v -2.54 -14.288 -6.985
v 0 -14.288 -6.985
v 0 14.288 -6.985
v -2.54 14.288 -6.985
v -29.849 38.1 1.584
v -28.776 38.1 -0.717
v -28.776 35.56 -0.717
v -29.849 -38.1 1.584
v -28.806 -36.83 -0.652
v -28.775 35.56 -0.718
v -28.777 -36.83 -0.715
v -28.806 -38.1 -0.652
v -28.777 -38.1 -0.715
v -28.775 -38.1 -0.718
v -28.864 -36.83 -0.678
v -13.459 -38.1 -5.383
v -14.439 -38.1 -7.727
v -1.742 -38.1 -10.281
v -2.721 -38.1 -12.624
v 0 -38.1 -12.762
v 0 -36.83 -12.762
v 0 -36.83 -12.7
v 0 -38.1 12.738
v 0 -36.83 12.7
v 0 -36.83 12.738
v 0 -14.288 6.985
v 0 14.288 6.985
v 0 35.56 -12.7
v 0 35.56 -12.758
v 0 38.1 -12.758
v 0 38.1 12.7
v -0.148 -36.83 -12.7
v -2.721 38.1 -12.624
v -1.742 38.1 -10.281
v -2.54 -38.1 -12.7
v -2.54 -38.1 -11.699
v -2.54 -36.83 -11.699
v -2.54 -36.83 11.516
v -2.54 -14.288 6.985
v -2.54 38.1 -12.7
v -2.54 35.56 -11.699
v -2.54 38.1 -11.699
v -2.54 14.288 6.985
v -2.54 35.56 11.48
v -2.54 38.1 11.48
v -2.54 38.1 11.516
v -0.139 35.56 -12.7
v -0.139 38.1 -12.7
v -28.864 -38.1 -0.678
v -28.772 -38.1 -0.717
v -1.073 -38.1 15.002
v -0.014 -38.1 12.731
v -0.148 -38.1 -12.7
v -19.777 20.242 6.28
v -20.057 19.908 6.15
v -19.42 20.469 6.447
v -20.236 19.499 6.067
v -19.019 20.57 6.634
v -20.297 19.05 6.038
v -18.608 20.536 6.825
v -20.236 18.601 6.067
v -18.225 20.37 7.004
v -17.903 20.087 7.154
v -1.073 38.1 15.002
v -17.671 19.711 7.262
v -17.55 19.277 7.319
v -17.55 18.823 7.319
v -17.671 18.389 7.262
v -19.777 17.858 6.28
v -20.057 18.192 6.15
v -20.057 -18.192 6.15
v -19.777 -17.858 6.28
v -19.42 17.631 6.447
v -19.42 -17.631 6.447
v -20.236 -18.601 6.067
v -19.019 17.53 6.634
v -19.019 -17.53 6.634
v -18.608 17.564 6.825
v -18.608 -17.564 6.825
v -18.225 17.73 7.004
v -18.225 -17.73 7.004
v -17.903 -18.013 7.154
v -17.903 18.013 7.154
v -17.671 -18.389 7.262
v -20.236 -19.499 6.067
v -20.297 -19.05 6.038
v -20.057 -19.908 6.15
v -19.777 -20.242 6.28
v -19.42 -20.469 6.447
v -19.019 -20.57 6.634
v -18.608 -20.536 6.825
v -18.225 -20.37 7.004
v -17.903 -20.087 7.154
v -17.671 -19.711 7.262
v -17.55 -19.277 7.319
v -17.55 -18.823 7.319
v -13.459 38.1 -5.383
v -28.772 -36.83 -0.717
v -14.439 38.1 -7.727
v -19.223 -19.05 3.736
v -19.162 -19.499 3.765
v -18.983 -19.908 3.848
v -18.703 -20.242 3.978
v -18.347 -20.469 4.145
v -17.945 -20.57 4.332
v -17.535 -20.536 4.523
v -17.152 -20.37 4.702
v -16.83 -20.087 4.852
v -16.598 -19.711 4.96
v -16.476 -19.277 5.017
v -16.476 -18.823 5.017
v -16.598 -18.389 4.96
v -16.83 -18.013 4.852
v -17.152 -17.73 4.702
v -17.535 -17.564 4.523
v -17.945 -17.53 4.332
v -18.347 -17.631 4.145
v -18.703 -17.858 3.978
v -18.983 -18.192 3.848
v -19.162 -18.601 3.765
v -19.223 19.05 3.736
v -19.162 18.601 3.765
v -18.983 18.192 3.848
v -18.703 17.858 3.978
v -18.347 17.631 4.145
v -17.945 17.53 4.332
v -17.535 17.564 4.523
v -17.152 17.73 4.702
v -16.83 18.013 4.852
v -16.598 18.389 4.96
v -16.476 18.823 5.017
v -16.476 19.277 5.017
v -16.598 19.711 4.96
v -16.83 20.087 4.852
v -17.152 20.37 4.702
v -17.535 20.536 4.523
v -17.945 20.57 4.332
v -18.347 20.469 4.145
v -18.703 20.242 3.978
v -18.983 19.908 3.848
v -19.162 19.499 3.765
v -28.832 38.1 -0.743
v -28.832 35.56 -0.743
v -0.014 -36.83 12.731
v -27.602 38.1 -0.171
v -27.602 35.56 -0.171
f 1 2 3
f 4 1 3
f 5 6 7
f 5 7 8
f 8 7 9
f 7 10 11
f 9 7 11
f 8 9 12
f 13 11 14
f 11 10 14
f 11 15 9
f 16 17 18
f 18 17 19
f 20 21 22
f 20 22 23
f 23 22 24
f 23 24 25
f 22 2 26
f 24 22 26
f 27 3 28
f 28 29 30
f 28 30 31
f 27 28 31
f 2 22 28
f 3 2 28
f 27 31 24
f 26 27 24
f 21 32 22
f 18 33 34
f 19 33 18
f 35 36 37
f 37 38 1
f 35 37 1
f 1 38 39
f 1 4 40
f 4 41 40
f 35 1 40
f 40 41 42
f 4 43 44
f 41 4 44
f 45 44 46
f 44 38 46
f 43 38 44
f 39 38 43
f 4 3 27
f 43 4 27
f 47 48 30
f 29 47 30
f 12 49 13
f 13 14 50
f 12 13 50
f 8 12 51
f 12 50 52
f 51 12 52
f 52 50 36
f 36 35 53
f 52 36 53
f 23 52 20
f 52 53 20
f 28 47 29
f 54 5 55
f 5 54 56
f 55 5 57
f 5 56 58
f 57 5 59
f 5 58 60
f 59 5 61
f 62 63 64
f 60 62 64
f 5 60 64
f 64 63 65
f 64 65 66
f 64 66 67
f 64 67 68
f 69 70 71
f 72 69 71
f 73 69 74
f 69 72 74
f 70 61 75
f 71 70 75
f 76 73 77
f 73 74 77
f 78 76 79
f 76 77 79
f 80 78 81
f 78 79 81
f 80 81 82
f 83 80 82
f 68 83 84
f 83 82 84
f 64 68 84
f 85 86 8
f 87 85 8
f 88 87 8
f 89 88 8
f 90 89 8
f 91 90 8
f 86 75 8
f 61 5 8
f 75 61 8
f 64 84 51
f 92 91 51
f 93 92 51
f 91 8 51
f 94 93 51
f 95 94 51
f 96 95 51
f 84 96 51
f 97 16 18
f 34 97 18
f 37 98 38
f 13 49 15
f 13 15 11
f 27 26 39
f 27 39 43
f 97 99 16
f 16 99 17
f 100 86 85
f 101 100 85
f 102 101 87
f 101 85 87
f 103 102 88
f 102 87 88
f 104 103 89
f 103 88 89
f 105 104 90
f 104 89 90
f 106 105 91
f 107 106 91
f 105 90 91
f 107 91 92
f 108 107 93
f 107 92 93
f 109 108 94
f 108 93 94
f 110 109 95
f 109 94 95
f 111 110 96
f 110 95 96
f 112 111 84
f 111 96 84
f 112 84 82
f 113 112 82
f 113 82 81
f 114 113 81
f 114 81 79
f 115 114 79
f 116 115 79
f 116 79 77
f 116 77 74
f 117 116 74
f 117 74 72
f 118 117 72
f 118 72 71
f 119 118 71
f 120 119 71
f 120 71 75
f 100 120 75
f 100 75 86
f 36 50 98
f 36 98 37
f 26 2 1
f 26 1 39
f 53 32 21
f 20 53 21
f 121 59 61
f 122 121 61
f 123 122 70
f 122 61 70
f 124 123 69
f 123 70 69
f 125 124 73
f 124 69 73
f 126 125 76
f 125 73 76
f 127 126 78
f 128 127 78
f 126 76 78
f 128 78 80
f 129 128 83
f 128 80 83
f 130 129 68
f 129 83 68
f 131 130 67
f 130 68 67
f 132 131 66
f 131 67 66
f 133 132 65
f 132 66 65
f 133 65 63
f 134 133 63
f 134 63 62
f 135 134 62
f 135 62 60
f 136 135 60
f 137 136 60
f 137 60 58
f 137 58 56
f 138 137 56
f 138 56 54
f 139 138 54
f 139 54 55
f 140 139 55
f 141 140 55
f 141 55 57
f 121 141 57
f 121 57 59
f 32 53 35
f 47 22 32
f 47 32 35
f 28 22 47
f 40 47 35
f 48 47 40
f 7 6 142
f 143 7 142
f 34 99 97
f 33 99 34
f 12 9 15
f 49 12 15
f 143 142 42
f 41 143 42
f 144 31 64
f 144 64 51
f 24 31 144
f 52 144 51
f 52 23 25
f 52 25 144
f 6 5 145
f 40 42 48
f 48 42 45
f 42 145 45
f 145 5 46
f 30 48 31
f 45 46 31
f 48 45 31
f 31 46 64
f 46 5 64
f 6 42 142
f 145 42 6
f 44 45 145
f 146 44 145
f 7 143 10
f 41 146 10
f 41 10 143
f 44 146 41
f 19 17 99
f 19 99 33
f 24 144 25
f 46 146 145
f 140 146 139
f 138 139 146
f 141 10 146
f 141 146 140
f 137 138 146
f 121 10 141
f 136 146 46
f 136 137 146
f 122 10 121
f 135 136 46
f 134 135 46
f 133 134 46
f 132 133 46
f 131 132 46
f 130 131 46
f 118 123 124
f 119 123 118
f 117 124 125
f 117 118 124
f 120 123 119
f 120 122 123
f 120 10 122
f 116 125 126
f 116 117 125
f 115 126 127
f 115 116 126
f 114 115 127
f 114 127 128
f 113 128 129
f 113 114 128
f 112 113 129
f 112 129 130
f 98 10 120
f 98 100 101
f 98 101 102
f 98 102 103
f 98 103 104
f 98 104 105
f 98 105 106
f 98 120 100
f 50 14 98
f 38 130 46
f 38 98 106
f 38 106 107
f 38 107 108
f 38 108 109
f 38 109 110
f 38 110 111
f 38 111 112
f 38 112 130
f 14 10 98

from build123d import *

# Parameters (mm, degrees)
F7_DEPTH  = 1.27
F8_DEPTH  = 1.27
F0_W      = 76.2
F0_H      = 25.4
F0_W_2    = 28.575
F0_H_2    = 13.97
F9_DEPTH  = 2.54
F2_W      = 31.75
F2_H      = 76.2
F10_DEPTH = 2.54
F11_DEPTH = 2.54
F12_D     = 3.048
F14_W     = 12.7
F14_H     = 76.2
F15_DEPTH = 2.54


with BuildPart() as f7:
    # F6 (on offset) → F7 (new body)
    with BuildSketch(Plane.XZ.offset(38.1)):
        Polygon((0, -12.7621218562), (0, 12.7376662567), (-28.863908723, -0.6782670389), align=None)
    extrude(amount=-F7_DEPTH)

    # F6 (on offset) → F8 (join)
    with BuildSketch(Plane.XZ.offset(38.1)):
        Polygon((0, -12.7621218562), (0, 12.7376662567), (-28.863908723, -0.6782670389), align=None)
    extrude(amount=-F8_DEPTH)

    # F0 (on Right) → F9 (join)
    with BuildSketch(Plane.YZ):
        Rectangle(F0_W, F0_H)
        Rectangle(F0_W_2, F0_H_2, mode=Mode.SUBTRACT)
    extrude(amount=-F9_DEPTH)

    # F2 (on line) → F10 (join)
    with BuildSketch(Plane(origin=(-4.8643822138, 0, 10.4317013215), x_dir=(0.906307787, 0, 0.4226182617), z_dir=(0.4226182617, 0, -0.906307787))):
        with Locations((-10.5077480759, 0)):
            Rectangle(F2_W, F2_H)
    extrude(amount=-F10_DEPTH)

    # F5 (on offset) → F11 (join)
    with BuildSketch(Plane.XZ.offset(-38.1)):
        Polygon((0, -12.7577763051), (0, 12.6607520506), (-28.8317464292, -0.7427155506), align=None)
    extrude(amount=F11_DEPTH)

    # F12 (through all)
    with Locations(Plane(origin=(-4.8643822138, 0, 10.4317013215), x_dir=(0.906307787, 0, 0.4226182617), z_dir=(0.4226182617, 0, -0.906307787))):
        with Locations((-14.3194701523, 19.05), (-14.3194701523, -19.05)):
            Hole(F12_D / 2)


with BuildPart() as f15:
    # F14 (on face) → F15 (new body)
    with BuildSketch(Plane(origin=(-4.8965176408, 0, -11.7150507734), x_dir=(0.9226500445, 0, -0.3856382961), z_dir=(-0.3856382961, 0, -0.9226500445))):
        with Locations((-3.9923936394, 0)):
            Rectangle(F14_W, F14_H)
    extrude(amount=-F15_DEPTH)


solid = Compound([f7.part, f15.part])
